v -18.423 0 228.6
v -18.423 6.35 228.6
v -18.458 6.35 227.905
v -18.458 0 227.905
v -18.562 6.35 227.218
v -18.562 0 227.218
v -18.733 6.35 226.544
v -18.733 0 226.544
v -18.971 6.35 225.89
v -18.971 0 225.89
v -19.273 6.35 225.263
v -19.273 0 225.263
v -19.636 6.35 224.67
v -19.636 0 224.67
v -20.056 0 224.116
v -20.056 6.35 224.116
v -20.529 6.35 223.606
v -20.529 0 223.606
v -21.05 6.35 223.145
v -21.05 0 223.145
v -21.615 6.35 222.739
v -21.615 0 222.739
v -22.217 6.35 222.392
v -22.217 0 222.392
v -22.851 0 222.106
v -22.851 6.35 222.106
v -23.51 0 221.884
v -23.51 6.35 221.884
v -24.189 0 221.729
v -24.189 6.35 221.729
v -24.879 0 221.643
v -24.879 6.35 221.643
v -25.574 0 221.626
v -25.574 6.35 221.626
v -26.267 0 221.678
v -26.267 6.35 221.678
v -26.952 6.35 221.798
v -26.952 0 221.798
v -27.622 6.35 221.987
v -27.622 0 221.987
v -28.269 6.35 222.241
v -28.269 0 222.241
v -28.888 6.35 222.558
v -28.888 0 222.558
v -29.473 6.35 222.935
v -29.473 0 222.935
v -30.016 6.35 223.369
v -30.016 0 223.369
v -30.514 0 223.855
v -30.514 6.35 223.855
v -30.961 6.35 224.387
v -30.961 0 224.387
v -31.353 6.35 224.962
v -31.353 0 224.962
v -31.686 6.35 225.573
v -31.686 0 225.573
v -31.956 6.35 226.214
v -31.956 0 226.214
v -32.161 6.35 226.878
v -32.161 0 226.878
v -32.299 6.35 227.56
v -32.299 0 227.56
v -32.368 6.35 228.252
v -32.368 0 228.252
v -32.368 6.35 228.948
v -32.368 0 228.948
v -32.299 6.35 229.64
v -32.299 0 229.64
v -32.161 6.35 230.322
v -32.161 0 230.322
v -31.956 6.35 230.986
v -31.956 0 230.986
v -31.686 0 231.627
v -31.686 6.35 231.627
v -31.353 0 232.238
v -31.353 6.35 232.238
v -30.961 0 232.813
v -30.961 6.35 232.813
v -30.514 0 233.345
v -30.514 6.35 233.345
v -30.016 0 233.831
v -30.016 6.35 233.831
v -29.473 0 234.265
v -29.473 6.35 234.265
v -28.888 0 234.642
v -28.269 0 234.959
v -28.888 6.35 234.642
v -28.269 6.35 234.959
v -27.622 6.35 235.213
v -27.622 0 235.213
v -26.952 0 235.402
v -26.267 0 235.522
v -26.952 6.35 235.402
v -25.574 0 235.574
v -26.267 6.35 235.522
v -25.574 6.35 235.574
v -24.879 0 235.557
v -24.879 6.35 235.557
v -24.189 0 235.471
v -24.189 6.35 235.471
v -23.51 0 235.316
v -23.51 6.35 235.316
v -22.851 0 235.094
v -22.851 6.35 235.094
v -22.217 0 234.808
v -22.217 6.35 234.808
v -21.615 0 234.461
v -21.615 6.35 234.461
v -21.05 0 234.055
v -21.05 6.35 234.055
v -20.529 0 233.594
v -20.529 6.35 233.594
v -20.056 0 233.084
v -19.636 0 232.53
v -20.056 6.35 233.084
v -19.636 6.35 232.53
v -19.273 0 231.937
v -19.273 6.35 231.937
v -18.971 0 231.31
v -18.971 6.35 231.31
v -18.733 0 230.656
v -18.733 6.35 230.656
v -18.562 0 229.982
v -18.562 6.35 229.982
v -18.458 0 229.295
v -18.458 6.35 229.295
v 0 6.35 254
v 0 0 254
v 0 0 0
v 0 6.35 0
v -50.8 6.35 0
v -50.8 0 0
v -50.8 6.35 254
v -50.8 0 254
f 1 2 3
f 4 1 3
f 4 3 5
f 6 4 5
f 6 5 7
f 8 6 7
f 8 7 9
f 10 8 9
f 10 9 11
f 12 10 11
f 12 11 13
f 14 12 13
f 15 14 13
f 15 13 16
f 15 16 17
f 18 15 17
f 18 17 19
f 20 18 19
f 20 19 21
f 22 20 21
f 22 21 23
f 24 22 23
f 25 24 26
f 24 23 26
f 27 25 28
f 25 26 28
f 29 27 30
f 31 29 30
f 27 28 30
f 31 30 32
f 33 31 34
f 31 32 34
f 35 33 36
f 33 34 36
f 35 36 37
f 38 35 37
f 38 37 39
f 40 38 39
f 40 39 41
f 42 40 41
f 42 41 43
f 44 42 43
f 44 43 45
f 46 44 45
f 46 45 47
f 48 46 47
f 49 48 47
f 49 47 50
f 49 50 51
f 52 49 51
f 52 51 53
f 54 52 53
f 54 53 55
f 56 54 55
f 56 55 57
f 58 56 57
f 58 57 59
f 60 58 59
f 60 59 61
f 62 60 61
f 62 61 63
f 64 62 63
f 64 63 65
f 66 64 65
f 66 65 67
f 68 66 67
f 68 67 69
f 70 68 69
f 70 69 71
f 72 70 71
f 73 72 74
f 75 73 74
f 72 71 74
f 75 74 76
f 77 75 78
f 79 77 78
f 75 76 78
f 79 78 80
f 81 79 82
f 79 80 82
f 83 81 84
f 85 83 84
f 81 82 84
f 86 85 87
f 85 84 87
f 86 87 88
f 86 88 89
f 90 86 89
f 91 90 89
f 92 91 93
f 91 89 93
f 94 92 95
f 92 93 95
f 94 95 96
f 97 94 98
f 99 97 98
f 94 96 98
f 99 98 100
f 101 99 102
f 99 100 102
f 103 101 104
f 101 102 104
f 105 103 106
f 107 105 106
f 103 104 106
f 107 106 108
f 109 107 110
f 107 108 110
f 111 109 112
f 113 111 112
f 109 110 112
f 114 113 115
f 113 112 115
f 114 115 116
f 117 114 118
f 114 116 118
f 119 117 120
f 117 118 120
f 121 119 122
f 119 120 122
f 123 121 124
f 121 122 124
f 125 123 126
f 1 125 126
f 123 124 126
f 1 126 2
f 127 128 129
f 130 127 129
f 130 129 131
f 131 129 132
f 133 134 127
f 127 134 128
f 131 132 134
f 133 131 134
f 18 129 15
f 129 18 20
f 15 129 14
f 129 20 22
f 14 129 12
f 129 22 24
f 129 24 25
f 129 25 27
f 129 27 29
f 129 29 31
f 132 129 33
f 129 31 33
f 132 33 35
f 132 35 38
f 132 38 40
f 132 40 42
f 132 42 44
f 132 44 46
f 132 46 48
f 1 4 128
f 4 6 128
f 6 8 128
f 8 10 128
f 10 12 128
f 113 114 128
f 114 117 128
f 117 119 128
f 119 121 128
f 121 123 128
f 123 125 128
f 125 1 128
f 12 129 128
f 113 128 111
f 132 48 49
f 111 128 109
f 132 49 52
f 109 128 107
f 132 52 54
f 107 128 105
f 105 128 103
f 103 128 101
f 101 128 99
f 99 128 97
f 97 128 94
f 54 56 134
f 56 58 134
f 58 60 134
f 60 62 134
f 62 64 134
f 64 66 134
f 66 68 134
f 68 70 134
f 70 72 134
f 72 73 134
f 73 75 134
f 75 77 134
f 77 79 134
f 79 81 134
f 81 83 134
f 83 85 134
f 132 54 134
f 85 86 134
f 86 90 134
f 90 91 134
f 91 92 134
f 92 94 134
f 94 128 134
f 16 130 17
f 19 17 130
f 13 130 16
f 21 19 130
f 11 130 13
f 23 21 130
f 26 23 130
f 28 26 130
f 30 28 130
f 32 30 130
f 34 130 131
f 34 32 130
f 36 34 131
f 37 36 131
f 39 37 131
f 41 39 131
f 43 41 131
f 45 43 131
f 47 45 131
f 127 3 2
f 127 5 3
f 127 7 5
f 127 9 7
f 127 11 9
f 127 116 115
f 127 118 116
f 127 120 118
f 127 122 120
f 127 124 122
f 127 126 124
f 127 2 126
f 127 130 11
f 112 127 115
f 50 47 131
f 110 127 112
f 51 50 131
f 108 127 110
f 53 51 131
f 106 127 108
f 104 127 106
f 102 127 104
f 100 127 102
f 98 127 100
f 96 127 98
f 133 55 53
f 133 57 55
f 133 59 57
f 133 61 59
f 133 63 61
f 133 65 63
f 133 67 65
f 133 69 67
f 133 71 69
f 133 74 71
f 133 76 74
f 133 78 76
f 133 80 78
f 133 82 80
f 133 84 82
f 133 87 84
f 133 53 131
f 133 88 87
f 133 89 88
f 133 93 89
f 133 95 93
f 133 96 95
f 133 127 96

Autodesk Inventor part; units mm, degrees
ref_plane "YZ Plane" through (0, 0, 0) normal (1, 0, 0) x (0, 1, 0)
ref_plane "XZ Plane" through (0, 0, 0) normal (0, 1, 0) x (-1, 0, 0)
ref_plane "XY Plane" through (0, 0, 0) normal (0, 0, 1) x (1, 0, 0)
sketch "Sketch1" plane through (0, 0, 0) normal (0, 1, 0) x (-1, 0, 0)
  line L0 (0, 0) -> (50.8, 0)
  line L1 (50.8, 0) -> (50.8, 254)
  line L2 (50.8, 254) -> (0, 254)
  line L3 (0, 254) -> (0, 0)
  dimension "d0" = 50.8
  dimension "d1" = 254
extrude "Extrusion1" add sketch "Sketch1" along normal blind 6.35
sketch "Sketch2" plane through (0, 6.35, 0) normal (0, 1, 0) x (1, 0, 0)
  line L0 (-50.8, -254) -> (0, -254) projected
  circle A0 centre (-25.4, -228.6) radius 6.9766
  dimension "d4" = 25.4
extrude "Extrusion2" cut sketch "Sketch2" against normal blind 25.4
properties part number "heightMarker" material "Gold"
